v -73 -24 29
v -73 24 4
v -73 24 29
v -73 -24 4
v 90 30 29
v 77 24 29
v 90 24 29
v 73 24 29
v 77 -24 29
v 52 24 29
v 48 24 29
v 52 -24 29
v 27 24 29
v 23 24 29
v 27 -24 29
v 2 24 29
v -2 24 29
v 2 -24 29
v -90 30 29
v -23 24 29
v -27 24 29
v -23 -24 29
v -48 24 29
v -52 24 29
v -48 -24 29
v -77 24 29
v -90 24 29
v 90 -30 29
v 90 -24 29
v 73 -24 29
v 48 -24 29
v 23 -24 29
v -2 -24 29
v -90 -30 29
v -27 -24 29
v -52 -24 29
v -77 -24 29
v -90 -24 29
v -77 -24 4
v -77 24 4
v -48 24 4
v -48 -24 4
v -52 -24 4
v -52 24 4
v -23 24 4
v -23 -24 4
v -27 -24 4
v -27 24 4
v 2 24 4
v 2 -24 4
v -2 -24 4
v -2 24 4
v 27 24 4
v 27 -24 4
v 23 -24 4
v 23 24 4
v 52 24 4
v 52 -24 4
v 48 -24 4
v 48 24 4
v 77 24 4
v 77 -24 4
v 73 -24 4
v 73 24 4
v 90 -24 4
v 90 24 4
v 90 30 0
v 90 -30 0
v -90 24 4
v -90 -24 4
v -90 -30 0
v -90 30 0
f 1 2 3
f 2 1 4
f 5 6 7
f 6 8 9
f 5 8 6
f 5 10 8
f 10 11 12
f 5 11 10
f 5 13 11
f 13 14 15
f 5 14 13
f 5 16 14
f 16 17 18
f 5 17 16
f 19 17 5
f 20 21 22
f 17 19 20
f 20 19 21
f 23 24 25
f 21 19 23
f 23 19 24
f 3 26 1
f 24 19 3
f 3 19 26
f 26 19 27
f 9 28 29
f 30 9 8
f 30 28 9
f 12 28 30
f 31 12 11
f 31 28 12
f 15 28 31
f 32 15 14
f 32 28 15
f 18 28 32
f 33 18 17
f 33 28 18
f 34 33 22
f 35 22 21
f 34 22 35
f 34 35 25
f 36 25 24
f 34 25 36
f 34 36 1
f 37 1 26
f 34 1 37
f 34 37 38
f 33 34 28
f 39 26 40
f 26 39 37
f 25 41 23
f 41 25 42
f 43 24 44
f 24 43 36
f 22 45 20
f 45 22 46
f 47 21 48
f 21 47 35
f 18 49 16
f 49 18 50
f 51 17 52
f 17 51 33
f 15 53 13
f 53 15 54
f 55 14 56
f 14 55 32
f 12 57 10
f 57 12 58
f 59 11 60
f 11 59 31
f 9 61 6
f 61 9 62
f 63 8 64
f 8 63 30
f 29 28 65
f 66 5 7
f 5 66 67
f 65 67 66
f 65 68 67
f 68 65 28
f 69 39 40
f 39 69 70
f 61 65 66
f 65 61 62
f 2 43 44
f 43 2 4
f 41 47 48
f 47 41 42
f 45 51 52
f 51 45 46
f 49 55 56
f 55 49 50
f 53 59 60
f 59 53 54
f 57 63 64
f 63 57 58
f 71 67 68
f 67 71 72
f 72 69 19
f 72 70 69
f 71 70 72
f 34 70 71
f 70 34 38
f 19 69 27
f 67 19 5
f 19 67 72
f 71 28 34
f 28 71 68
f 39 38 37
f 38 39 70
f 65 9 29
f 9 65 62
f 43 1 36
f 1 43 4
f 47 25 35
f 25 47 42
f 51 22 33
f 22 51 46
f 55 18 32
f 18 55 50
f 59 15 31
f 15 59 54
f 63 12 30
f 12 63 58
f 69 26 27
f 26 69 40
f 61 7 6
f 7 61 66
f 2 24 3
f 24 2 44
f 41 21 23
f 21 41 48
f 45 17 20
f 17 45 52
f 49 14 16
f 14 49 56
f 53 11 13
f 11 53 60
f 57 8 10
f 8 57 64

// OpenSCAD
$fn = 32;

// ----------------------------------------------------------------------
// Rib frame 180 x 60 x 29
// 7 ribs at 25 mm pitch
// ----------------------------------------------------------------------

// --- parameters (mm) ---
frame = [180, 60, 4];  // base plate size (x, y, z)
rail_w = 6;            // side rail width
ribs = 7;              // number of ribs
rib_t = 4;             // rib thickness
rib_h = 25;            // rib height above the base plate
pitch = 25;            // pitch between rib centres

// --- derived feature positions (mm) ---
span = (ribs - 1) * pitch;          // = 150   distance between the outer ribs
origin_x = -span / 2;               // = -75   X of the first rib
rib_len = frame[1] - 2 * rail_w + 2;  // = 50   rib length, 1 mm into each rail
feature_centers = [
  [origin_x + 0 * pitch, 0],
  [origin_x + 1 * pitch, 0],
  [origin_x + 2 * pitch, 0],
  [origin_x + 3 * pitch, 0],
  [origin_x + 4 * pitch, 0],
  [origin_x + 5 * pitch, 0],
  [origin_x + 6 * pitch, 0]
];   // rib centre line, drives the rib loop

// base plate, two side rails, then the ribs read straight off feature_centers
union() {
  translate([-frame[0] / 2, -frame[1] / 2, 0]) cube(frame);
  translate([-frame[0] / 2, -frame[1] / 2, 0]) cube([frame[0], rail_w, frame[2] + rib_h]);
  translate([-frame[0] / 2, frame[1] / 2 - rail_w, 0]) cube([frame[0], rail_w, frame[2] + rib_h]);
  for (centre = feature_centers)
    translate([centre[0] - rib_t / 2, centre[1] - rib_len / 2, frame[2] - 1])
      cube([rib_t, rib_len, rib_h + 1]);
}
